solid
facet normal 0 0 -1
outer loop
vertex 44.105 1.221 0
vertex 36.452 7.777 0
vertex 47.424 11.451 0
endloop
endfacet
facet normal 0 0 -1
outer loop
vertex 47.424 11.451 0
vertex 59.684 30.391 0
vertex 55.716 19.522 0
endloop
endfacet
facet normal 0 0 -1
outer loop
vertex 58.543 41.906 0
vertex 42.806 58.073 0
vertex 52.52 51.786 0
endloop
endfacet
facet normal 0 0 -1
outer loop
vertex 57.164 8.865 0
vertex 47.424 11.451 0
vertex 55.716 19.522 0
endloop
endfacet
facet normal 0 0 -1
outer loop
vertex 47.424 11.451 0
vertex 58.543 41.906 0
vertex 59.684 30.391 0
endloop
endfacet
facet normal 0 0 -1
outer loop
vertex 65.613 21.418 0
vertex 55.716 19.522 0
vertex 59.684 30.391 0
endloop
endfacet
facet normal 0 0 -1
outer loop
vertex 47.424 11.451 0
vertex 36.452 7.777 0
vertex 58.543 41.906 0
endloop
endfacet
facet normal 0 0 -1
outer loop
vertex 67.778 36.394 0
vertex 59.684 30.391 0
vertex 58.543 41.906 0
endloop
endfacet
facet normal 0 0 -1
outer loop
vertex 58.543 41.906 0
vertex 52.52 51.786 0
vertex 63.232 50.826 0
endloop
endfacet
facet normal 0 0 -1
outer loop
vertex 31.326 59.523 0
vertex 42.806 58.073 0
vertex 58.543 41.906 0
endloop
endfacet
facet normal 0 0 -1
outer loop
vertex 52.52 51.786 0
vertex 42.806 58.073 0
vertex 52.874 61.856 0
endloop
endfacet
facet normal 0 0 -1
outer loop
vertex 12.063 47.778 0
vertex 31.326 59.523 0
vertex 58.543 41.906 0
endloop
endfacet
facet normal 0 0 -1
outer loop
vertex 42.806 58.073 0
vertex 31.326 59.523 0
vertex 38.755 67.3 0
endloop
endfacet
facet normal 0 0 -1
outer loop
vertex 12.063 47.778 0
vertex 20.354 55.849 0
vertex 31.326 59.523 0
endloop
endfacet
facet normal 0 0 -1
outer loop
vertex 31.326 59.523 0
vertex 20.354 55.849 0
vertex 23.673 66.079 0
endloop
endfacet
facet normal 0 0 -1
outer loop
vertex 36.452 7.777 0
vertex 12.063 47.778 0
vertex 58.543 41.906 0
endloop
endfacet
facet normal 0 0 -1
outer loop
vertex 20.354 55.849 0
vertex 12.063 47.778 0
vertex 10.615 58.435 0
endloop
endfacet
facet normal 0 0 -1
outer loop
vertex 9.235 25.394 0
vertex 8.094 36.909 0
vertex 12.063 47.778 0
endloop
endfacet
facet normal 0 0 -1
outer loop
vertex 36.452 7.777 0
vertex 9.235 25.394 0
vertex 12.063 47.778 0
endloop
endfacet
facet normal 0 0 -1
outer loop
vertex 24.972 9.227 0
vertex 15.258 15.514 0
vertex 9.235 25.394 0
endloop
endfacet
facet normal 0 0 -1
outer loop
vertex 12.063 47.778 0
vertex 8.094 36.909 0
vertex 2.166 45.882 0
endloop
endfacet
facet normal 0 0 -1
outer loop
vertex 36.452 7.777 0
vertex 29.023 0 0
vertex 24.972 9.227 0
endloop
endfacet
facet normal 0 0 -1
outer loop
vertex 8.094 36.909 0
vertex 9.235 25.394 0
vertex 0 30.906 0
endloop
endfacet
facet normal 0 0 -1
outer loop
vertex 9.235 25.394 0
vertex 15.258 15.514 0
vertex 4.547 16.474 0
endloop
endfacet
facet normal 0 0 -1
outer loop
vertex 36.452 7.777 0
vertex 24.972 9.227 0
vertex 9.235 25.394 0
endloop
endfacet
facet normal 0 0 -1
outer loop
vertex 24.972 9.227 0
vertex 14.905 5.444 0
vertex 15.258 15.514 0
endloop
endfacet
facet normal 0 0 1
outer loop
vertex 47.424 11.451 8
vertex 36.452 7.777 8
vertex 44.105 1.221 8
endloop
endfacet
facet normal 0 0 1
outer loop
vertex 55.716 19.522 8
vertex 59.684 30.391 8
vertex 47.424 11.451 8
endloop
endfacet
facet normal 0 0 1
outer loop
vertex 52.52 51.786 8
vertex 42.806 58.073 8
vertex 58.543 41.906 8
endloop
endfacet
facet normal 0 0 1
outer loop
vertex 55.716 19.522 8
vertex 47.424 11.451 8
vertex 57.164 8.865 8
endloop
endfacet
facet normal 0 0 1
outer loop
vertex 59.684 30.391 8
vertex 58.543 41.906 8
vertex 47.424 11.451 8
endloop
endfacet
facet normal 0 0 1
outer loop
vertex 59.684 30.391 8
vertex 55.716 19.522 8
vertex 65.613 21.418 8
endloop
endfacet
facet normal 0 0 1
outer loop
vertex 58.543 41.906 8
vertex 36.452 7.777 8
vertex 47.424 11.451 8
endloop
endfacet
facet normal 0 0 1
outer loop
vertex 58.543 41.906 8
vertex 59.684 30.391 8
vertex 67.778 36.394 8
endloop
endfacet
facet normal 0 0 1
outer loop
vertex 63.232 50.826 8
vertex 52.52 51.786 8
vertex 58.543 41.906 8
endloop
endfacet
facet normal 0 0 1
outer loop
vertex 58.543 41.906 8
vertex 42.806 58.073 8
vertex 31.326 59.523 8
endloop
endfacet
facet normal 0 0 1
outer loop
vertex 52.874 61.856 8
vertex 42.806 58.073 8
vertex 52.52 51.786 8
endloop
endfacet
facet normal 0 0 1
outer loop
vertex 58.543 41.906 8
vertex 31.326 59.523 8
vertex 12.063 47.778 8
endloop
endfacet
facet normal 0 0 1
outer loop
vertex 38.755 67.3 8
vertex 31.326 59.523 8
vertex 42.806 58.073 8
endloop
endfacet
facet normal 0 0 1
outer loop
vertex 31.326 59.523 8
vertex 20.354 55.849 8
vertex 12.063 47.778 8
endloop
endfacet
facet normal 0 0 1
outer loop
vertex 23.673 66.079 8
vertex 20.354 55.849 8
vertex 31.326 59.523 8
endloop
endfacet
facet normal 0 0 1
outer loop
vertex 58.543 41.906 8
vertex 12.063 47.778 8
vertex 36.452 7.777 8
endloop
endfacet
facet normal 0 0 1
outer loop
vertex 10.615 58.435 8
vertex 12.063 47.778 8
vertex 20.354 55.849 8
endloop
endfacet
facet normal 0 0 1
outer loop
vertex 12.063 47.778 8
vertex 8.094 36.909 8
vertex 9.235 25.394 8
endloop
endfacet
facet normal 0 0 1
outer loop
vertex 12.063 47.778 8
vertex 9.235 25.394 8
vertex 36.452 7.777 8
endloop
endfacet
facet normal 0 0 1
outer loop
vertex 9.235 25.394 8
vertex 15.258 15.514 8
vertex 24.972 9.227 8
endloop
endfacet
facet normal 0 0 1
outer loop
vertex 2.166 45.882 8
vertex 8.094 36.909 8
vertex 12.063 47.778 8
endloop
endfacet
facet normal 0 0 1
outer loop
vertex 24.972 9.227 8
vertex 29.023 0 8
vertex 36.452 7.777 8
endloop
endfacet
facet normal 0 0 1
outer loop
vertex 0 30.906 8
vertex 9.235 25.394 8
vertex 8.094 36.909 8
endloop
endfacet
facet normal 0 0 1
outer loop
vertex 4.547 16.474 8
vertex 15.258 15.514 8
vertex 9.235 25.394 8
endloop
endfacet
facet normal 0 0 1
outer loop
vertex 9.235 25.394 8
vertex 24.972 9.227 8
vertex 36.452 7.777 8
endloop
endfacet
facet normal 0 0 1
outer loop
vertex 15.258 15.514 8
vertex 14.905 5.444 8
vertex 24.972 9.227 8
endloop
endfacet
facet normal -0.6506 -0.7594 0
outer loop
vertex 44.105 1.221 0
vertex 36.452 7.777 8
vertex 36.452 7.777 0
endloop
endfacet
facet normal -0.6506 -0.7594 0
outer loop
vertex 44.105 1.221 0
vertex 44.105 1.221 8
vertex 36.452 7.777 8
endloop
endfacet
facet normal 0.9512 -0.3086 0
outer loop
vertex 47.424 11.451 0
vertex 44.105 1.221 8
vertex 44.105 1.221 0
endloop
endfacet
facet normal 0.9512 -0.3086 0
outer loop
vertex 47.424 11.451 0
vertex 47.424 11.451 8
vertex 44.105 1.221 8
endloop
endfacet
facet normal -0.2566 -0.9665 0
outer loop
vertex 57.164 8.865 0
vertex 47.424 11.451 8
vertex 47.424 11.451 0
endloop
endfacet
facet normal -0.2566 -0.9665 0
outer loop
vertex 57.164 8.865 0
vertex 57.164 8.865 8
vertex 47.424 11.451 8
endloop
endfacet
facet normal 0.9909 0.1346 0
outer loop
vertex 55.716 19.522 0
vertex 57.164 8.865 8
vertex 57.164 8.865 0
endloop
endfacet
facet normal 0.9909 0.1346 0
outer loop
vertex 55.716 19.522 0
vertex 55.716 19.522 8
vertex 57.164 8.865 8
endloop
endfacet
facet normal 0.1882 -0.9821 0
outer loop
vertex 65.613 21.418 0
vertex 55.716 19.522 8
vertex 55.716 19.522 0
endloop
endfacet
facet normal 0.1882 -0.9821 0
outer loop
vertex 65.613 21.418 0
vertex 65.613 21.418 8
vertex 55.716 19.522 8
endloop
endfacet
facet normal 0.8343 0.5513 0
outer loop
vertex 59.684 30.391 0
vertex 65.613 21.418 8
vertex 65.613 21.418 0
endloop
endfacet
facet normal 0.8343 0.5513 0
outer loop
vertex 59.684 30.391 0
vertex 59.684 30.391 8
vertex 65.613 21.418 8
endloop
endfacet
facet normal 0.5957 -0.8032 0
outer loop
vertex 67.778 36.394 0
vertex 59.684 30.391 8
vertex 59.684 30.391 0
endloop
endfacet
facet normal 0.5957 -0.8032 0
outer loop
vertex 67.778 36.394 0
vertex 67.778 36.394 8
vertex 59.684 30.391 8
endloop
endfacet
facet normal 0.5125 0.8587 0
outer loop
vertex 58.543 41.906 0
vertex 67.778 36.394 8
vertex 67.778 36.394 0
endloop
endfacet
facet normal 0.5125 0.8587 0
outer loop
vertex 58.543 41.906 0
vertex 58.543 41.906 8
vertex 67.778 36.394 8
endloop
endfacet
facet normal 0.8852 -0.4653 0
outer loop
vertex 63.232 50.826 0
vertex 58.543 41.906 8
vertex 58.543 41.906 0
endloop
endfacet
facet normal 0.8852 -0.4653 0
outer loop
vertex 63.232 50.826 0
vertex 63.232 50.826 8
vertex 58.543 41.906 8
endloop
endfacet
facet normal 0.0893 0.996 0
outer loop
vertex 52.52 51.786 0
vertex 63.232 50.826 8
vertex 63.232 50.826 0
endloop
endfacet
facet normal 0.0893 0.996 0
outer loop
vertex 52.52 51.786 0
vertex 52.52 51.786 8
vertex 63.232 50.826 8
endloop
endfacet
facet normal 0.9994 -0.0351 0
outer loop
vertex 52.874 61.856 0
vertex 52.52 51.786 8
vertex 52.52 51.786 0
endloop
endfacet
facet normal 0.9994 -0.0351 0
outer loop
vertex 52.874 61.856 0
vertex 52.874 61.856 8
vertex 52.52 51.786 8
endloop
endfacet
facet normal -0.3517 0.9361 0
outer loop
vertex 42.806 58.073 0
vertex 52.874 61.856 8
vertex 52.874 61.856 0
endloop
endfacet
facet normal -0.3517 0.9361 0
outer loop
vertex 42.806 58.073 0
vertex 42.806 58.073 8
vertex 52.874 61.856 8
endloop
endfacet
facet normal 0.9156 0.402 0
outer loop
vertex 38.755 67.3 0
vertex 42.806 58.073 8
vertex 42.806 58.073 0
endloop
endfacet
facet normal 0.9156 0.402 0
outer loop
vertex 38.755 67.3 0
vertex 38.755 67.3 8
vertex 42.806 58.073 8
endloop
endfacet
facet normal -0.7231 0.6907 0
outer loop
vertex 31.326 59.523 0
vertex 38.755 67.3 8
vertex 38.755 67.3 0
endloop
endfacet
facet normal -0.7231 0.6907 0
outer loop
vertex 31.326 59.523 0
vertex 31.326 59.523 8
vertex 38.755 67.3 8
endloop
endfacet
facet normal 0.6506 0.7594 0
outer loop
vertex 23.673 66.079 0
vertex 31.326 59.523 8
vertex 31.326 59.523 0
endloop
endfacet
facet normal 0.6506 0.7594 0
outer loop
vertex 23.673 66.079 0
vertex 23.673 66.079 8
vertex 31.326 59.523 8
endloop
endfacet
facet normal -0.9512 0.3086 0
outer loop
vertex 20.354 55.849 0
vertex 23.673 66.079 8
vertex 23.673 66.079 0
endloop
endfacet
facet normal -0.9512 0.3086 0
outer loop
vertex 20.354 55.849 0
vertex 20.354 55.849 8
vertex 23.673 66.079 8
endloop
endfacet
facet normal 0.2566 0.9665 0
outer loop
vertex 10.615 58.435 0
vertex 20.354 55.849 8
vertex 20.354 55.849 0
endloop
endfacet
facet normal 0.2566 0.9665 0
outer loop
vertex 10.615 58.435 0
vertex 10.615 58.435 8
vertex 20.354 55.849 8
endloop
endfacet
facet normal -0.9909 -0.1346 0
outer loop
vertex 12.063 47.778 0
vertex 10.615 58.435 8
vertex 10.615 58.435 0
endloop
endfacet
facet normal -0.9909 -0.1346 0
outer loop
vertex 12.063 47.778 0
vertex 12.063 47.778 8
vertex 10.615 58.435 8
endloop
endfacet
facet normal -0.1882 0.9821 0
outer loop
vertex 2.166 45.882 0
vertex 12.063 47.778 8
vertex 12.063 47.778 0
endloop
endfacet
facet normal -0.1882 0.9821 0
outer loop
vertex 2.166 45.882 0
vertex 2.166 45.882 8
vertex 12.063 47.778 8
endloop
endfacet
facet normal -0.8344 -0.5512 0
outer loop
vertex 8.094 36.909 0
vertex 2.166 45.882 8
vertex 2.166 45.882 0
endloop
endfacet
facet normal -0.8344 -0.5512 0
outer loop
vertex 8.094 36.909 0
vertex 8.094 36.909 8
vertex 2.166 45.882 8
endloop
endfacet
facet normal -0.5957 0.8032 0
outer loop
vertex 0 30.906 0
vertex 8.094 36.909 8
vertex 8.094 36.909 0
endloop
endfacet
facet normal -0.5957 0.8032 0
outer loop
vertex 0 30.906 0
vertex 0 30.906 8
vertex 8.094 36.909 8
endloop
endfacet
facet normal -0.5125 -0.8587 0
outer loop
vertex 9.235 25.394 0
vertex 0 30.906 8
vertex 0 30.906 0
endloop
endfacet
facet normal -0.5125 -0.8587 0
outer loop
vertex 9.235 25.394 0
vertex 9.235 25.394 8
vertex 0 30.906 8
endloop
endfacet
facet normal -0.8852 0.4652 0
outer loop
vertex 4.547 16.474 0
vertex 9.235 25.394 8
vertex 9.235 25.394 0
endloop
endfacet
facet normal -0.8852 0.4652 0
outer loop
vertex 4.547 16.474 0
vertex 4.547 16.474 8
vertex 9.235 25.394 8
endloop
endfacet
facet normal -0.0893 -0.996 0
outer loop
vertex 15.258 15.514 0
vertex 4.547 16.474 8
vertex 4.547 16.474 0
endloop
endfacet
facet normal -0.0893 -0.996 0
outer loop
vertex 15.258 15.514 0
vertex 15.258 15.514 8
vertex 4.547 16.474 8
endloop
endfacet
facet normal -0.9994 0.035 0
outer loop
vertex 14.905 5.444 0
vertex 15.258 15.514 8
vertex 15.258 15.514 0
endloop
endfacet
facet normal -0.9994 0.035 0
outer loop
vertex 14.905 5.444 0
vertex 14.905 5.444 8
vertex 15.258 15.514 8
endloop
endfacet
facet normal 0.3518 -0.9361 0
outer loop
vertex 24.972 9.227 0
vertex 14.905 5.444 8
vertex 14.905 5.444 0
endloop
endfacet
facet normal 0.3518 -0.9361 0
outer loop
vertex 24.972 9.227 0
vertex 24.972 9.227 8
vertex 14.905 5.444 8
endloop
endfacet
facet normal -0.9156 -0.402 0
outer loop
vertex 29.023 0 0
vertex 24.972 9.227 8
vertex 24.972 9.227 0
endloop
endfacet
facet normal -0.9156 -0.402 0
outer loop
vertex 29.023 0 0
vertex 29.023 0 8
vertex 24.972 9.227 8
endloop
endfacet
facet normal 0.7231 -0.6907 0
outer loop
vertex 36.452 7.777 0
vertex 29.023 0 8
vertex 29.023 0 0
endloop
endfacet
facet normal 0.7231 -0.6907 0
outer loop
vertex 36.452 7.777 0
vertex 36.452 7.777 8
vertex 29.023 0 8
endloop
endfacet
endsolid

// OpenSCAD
$fn = 32;

// ----------------------------------------------------------------------
// Chain sprocket: 14 teeth, 26 mm root radius
// ----------------------------------------------------------------------

// --- parameters (mm) ---
profile_height = 8;       // extrusion height
profile_points = 28;      // points of the closed outline

profile = [[59.684, 30.391], [67.778, 36.394], [58.543, 41.906], [63.232, 50.826], [52.52, 51.786], [52.874, 61.856], [42.806, 58.073], [38.755, 67.3], [31.326, 59.523], [23.673, 66.079], [20.354, 55.849], [10.615, 58.435], [12.063, 47.778], [2.166, 45.882], [8.094, 36.909], [0, 30.906], [9.235, 25.394], [4.547, 16.474], [15.258, 15.514], [14.905, 5.444], [24.972, 9.227], [29.023, 0], [36.452, 7.777], [44.105, 1.221], [47.424, 11.451], [57.164, 8.865], [55.716, 19.522], [65.613, 21.418]];  // single closed polygon, 28 points, counter clockwise

// --- the one profile operation ---
linear_extrude(height = profile_height) polygon(points = profile);
